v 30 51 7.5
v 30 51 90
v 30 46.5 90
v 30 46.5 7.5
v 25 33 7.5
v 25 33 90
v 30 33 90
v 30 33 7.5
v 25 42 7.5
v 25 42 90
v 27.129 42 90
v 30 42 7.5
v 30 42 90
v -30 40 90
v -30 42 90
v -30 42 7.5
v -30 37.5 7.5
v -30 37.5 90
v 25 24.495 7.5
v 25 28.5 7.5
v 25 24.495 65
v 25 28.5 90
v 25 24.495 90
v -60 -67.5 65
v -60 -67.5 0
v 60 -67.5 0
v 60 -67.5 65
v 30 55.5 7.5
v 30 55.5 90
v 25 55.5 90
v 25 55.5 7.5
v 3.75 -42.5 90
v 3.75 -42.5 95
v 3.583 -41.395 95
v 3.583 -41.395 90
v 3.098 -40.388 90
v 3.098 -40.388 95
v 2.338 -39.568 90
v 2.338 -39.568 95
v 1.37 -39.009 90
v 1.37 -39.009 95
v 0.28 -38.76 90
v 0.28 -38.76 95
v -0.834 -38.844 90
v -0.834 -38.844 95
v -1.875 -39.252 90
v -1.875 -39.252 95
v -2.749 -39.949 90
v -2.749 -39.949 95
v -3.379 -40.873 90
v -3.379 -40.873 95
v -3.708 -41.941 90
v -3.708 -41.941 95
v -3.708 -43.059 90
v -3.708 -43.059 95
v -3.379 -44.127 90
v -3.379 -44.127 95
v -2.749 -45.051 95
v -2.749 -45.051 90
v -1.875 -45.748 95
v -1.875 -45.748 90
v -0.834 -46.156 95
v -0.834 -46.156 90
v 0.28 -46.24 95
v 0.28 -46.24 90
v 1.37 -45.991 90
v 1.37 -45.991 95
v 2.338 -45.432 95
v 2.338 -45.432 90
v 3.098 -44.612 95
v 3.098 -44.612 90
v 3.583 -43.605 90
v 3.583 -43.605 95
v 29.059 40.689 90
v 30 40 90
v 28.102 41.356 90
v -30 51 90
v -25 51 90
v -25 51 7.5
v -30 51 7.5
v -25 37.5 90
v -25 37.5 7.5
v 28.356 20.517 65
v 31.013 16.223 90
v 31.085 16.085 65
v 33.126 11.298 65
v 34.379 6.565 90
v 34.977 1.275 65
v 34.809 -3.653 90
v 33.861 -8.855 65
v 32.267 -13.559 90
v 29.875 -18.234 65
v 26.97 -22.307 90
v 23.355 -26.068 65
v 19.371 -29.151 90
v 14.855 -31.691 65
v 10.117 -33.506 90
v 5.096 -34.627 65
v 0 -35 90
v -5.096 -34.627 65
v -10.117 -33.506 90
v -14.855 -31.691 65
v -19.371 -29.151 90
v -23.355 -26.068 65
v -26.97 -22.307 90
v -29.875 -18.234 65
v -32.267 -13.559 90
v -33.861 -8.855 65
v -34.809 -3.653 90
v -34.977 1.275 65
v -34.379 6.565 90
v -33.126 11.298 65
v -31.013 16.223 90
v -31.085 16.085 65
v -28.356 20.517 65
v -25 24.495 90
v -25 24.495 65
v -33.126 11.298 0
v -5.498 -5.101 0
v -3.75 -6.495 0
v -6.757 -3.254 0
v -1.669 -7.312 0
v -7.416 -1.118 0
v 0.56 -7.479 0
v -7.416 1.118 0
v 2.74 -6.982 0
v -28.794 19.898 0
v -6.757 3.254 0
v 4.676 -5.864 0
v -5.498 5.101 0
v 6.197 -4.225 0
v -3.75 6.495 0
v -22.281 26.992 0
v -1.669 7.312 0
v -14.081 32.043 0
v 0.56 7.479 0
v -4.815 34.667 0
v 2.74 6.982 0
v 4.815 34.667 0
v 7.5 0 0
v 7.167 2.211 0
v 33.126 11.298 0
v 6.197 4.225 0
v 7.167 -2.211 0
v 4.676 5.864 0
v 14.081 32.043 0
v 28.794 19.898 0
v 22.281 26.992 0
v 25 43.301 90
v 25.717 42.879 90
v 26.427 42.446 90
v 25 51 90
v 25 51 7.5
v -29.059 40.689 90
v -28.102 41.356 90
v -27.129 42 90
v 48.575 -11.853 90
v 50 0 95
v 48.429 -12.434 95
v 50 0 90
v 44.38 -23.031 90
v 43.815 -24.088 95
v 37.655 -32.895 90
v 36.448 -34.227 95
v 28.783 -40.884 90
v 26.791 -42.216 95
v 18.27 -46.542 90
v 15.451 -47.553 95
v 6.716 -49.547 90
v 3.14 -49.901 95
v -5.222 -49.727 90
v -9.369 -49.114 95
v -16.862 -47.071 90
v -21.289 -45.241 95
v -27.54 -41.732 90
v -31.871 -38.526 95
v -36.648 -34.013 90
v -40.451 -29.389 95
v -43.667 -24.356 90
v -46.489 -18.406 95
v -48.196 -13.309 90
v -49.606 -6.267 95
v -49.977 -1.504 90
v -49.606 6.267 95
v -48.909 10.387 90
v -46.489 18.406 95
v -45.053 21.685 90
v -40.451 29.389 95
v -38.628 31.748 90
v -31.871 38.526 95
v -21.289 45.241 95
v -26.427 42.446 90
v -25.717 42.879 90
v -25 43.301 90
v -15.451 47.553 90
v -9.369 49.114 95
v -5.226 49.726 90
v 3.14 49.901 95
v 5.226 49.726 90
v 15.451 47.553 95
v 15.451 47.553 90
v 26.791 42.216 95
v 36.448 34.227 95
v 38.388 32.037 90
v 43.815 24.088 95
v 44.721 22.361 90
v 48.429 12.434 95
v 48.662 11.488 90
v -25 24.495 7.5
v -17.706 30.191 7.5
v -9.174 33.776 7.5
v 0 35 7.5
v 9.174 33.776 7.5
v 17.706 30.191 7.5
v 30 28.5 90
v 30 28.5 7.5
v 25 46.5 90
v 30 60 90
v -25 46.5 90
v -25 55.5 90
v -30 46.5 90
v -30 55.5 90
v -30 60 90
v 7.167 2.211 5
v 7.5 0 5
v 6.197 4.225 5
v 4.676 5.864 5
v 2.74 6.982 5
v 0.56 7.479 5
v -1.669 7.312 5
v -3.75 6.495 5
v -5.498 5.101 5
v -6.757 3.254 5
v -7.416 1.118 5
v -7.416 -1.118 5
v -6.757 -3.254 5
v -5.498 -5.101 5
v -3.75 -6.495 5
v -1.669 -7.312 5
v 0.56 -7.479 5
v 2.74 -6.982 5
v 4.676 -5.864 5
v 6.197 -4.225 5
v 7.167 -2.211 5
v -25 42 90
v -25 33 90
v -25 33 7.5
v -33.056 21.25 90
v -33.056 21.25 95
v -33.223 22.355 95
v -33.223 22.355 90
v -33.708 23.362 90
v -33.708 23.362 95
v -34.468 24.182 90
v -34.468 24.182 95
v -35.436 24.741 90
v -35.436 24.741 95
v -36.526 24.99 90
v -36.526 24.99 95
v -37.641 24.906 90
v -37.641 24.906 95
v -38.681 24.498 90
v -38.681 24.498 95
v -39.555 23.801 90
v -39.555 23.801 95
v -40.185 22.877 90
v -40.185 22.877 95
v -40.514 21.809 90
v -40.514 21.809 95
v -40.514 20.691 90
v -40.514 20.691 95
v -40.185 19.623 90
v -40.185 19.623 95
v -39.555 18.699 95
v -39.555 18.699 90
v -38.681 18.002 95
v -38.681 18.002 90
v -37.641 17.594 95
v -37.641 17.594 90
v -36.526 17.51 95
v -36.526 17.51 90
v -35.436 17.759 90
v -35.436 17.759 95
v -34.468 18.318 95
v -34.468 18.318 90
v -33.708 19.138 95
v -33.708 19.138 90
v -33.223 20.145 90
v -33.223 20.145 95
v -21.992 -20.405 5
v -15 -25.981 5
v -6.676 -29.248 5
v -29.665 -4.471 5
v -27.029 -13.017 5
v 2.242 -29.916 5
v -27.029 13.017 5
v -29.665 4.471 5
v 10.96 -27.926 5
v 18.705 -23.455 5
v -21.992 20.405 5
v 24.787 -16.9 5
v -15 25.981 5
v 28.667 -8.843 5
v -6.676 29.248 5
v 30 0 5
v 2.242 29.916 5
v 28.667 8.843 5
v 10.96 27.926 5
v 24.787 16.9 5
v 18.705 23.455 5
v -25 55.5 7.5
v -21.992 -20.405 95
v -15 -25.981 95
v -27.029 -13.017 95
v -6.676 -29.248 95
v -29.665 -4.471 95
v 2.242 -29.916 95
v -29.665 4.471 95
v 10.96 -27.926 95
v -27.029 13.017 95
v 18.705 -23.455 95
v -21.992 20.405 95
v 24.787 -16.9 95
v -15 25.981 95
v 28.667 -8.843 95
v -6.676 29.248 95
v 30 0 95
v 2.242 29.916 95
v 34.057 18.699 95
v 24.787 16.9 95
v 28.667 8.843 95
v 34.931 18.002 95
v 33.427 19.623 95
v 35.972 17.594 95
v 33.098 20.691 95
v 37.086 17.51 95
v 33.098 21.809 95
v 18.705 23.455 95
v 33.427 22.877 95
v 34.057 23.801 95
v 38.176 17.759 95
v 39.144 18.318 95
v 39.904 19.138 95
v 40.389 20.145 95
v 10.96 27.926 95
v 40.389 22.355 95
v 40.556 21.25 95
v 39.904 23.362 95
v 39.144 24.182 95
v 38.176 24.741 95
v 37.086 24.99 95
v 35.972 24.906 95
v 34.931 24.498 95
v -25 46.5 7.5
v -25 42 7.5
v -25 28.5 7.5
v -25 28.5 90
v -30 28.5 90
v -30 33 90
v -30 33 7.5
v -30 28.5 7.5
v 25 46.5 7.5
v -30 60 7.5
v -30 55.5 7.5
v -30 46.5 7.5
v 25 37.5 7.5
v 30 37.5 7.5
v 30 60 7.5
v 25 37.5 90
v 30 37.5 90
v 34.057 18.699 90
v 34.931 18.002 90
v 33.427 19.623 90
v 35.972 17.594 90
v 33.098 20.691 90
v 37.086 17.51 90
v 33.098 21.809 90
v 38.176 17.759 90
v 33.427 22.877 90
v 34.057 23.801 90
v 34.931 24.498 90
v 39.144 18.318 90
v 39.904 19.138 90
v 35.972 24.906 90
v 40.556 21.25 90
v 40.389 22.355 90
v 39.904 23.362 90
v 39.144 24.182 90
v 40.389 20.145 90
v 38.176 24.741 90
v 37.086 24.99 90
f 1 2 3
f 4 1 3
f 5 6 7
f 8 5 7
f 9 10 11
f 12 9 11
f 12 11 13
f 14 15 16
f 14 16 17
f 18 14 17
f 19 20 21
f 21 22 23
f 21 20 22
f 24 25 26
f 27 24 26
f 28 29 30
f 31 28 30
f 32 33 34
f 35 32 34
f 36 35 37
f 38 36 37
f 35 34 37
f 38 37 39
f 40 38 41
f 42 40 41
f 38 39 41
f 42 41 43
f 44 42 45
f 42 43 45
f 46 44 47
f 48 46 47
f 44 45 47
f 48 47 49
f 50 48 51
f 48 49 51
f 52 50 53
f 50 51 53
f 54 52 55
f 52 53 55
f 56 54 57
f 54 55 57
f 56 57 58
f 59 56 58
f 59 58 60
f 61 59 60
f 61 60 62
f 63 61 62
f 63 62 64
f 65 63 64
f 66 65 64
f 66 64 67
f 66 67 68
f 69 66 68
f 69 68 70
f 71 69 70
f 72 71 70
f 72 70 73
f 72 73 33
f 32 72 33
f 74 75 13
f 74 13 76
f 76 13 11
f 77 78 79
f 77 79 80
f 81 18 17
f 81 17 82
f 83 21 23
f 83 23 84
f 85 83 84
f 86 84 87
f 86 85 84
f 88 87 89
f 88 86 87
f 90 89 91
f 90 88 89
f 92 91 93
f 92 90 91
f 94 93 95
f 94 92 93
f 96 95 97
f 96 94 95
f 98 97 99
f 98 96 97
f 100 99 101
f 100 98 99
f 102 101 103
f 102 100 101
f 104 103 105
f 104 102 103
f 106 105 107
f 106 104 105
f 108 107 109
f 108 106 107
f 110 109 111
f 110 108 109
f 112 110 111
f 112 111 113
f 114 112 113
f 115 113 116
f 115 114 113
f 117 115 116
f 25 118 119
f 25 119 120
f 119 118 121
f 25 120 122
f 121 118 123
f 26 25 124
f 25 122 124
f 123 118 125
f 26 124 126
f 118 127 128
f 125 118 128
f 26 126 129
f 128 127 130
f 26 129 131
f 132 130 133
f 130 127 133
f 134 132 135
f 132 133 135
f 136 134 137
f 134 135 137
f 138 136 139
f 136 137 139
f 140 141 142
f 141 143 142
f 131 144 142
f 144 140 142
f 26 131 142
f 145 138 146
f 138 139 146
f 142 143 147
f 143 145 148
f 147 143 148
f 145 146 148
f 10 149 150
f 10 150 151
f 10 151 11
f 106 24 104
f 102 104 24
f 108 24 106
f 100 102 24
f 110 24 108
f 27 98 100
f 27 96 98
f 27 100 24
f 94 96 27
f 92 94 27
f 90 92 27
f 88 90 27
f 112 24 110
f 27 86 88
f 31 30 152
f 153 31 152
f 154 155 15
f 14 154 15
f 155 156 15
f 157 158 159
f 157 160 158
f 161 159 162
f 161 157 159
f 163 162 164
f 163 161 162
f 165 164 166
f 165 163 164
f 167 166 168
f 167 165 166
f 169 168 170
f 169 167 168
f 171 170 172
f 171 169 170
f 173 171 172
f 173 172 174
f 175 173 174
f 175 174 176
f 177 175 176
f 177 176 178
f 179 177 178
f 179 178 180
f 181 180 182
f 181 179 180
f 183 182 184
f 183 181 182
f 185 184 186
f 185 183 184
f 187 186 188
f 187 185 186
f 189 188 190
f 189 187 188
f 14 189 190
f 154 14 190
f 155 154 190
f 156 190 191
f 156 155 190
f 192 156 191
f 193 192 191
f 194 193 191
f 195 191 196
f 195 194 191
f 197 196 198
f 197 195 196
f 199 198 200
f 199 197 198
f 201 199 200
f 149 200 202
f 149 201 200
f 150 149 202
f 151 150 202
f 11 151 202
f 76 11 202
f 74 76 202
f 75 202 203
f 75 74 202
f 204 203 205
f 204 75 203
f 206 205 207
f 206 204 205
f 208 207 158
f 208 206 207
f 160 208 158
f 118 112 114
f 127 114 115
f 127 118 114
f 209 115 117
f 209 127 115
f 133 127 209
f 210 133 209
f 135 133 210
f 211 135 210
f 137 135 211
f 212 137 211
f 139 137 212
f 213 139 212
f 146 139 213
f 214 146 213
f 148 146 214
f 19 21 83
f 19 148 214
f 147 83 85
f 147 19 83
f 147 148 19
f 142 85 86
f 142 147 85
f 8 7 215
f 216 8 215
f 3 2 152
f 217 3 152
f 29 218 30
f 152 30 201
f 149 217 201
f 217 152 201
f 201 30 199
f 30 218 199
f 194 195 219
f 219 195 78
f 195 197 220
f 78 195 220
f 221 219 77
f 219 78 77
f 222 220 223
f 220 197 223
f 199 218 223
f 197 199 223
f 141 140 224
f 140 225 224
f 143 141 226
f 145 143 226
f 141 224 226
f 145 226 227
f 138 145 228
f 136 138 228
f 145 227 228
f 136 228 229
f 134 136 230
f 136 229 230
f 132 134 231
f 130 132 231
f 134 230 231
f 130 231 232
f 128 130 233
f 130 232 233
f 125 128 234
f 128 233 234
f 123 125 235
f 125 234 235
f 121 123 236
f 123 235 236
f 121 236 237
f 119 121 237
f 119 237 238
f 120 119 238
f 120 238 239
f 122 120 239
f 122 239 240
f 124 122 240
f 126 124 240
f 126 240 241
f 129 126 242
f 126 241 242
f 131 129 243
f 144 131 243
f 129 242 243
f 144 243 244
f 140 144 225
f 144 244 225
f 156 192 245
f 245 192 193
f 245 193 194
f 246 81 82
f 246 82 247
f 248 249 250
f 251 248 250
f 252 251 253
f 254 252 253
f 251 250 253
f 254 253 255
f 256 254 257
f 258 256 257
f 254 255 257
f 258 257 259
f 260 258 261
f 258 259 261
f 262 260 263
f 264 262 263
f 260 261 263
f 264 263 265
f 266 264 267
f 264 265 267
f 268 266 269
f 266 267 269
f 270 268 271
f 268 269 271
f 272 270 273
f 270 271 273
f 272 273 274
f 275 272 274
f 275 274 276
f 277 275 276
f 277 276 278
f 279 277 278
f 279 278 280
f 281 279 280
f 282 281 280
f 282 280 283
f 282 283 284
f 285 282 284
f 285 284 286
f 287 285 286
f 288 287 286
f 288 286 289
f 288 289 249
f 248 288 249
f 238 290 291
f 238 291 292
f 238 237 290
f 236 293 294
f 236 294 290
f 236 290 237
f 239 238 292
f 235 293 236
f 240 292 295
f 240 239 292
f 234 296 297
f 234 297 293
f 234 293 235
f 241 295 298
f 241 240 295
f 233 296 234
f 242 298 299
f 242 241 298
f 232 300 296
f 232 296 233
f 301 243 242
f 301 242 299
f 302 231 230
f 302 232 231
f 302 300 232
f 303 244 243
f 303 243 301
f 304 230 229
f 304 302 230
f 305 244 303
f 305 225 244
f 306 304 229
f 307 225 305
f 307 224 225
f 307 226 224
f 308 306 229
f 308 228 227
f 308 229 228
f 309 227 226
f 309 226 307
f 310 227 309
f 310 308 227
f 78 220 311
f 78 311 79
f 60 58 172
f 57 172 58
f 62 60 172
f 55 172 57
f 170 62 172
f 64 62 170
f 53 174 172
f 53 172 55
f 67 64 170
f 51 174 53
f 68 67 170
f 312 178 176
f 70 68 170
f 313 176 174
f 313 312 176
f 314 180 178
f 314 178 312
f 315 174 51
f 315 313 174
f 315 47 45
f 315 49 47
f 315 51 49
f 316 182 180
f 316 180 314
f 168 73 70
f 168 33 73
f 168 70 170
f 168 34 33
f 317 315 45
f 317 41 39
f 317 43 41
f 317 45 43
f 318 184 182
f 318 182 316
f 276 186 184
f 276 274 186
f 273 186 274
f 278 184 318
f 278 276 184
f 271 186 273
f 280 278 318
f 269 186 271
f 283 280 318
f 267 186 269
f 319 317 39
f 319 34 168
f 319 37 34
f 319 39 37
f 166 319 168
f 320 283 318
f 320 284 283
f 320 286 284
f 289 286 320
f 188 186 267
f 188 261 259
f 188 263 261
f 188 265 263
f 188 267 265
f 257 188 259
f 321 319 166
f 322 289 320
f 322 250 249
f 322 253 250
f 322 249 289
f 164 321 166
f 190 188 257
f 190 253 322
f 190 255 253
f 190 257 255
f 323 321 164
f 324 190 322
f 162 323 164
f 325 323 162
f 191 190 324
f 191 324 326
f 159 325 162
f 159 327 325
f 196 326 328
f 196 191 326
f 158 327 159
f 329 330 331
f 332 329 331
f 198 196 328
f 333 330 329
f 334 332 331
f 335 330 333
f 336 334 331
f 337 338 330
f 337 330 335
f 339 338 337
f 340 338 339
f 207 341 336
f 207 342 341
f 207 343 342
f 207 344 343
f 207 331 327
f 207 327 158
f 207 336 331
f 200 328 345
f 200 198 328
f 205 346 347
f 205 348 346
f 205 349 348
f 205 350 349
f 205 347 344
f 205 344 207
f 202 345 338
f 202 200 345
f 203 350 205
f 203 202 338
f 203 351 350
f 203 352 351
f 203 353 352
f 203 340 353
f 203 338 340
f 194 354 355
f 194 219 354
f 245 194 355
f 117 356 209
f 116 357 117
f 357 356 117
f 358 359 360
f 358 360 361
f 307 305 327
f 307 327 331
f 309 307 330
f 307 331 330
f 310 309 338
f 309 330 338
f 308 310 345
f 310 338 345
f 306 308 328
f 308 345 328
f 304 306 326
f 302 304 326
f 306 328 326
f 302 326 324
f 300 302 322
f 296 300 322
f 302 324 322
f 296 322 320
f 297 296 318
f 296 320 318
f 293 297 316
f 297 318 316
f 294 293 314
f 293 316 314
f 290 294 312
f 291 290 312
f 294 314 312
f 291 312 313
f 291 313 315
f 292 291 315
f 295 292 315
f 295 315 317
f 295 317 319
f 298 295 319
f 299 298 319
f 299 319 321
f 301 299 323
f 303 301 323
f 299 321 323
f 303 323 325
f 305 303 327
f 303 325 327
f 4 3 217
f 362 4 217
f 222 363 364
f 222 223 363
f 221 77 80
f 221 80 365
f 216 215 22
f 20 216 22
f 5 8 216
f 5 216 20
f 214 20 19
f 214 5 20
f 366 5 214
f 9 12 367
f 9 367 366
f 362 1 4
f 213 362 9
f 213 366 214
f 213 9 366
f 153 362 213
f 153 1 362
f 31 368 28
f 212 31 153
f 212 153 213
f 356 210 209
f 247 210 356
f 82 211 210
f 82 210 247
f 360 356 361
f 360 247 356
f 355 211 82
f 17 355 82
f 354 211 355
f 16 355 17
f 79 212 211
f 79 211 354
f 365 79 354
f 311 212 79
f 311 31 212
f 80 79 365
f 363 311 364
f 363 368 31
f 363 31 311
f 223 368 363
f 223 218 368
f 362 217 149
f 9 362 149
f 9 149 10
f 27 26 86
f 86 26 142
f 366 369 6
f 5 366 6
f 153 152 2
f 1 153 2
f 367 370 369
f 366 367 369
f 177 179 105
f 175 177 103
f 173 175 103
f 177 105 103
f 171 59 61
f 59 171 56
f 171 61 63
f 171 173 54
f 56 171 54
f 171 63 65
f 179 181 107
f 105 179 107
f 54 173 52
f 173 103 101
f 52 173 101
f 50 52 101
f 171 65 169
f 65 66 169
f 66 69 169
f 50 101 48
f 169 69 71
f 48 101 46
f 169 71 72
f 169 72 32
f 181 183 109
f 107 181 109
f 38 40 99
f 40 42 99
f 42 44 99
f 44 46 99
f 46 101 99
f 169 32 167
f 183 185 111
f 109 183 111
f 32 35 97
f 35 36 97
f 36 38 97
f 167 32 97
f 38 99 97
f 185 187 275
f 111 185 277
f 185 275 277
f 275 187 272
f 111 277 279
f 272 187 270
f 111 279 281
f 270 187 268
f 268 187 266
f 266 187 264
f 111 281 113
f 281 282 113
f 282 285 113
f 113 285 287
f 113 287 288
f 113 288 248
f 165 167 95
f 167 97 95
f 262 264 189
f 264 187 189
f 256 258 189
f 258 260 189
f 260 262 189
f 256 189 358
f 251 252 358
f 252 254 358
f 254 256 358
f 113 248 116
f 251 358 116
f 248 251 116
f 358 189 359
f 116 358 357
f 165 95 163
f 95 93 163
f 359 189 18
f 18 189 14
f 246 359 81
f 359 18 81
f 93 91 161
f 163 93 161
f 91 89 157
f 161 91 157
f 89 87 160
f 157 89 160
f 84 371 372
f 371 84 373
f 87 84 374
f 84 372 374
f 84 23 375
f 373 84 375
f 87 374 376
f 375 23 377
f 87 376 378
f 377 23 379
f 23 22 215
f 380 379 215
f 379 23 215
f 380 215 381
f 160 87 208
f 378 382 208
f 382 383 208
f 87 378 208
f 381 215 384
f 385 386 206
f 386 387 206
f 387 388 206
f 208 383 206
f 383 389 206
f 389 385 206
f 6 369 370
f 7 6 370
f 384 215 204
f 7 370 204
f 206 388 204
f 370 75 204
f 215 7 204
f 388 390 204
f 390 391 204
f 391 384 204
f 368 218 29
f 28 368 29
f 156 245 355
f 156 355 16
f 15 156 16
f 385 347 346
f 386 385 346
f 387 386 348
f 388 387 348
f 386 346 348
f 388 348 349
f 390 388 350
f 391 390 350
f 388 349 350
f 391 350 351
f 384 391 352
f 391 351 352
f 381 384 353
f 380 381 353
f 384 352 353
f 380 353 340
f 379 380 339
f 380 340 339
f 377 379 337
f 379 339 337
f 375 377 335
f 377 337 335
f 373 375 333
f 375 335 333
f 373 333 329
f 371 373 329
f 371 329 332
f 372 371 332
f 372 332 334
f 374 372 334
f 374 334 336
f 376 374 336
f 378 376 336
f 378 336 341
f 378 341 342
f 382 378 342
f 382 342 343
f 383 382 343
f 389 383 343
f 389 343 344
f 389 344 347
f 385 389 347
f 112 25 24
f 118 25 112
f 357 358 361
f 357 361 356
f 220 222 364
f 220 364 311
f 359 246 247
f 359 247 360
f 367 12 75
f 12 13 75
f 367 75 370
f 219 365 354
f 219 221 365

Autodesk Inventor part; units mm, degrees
ref_plane "YZ Plane" through (0, 0, 0) normal (1, 0, 0) x (0, 1, 0)
ref_plane "XZ Plane" through (0, 0, 0) normal (0, 1, 0) x (-1, 0, 0)
ref_plane "XY Plane" through (0, 0, 0) normal (0, 0, 1) x (1, 0, 0)
sketch "Sketch1" plane through (0, 0, 0) normal (0, 0, 1) x (1, 0, 0)
  arc A0 (33.1265, 11.2976) -> (-33.1265, 11.2976) centre (0, 0) ccw
  line L0 (-60, -67.5) -> (60, -67.5)
  line L1 (-60, -67.5) -> (-33.1265, 11.2976)
  line L2 (60, -67.5) -> (33.1265, 11.2976)
  point P0 (0, -67.5)
  dimension "d0" = 70
  dimension "d1" = 120
  dimension "d2" = 60
  dimension "d3" = 67.5
extrude "Extrusion1" add sketch "Sketch1" along normal blind 65
sketch "Sketch2" plane through (0, 0, 65) normal (0, 0, 1) x (1, 0, 0)
  circle A0 centre (0, 0) radius 35
  dimension "d6" = 70
extrude "Extrusion2" add sketch "Sketch2" along normal blind 25
sketch "Sketch3" plane through (0, 0, 90) normal (0, 0, 1) x (1, 0, 0)
  circle A0 centre (0, 0) radius 50
  dimension "d9" = 100
extrude "Extrusion3" add sketch "Sketch3" along normal blind 5
sketch "Sketch4" plane through (0, 0, 95) normal (0, 0, 1) x (1, 0, 0)
  circle A0 centre (0, -42.5) radius 3.75
  circle A1 centre (36.8061, 21.25) radius 3.75
  circle A2 centre (-36.8061, 21.25) radius 3.75
  point P0 (0, 0)
  dimension "d12" = 7.5
  dimension "d13" = 42.5
  dimension "d16" = 360
extrude "Extrusion4" cut sketch "Sketch4" against normal blind 5
sketch "Sketch5" plane through (0, 0, 90) normal (0, 0, -1) x (-1, 0, 0)
  line L0 (0, 60) -> (-30, 60)
  line L1 (-30, 60) -> (-30, 55.5)
  line L2 (-30, 55.5) -> (-25, 55.5)
  line L3 (-25, 55.5) -> (-25, 51)
  line L4 (-25, 51) -> (-30, 51)
  line L5 (-30, 51) -> (-30, 46.5)
  line L6 (-30, 46.5) -> (-25, 46.5)
  line L7 (-25, 46.5) -> (-25, 42)
  line L8 (-25, 42) -> (-30, 42)
  line L9 (-30, 42) -> (-30, 37.5)
  line L10 (-30, 37.5) -> (-25, 37.5)
  line L11 (-25, 37.5) -> (-25, 33)
  line L12 (-25, 33) -> (-30, 33)
  line L13 (-30, 33) -> (-30, 28.5)
  line L14 (-30, 28.5) -> (-25, 28.5)
  line L15 (-25, 28.5) -> (-25, 24)
  line L16 (-25, 24) -> (-30, 24)
  line L17 (-30, 24) -> (-30, 19.5)
  line L18 (-30, 19.5) -> (-25, 19.5)
  arc A0 (33.1265, 11.2976) -> (-33.1265, 11.2976) centre (0, 0) ccw projected
  line L19 (-25, 19.5) -> (0, 19.5)
  line L20 (0, 60) -> (30, 60)
  line L21 (30, 60) -> (30, 55.5)
  line L22 (30, 55.5) -> (25, 55.5)
  line L23 (25, 55.5) -> (25, 51)
  line L24 (25, 51) -> (30, 51)
  line L25 (30, 51) -> (30, 46.5)
  line L26 (30, 46.5) -> (25, 46.5)
  line L27 (25, 46.5) -> (25, 42)
  line L28 (25, 42) -> (30, 42)
  line L29 (30, 42) -> (30, 37.5)
  line L30 (30, 37.5) -> (25, 37.5)
  line L31 (25, 37.5) -> (25, 33)
  line L32 (25, 33) -> (30, 33)
  line L33 (30, 33) -> (30, 28.5)
  line L34 (30, 28.5) -> (25, 28.5)
  line L35 (25, 28.5) -> (25, 24)
  line L36 (25, 24) -> (30, 24)
  line L37 (30, 24) -> (30, 19.5)
  line L38 (30, 19.5) -> (25, 19.5)
  line L39 (25, 19.5) -> (0, 19.5)
  point P0 (0, 35)
  point P1 (-25, 24.4949)
  point P2 (25, 24.4949)
  dimension "d20" = 4.5
  dimension "d21" = 4.5
  dimension "d22" = 4.5
  dimension "d23" = 4.5
  dimension "d24" = 4.5
  dimension "d25" = 4.5
  dimension "d26" = 4.5
  dimension "d27" = 4.5
  dimension "d29" = 5
  dimension "d30" = 5
  dimension "d31" = 4.5
  dimension "d32" = 30
  dimension "d34" = 60
extrude "Extrusion5" add sketch "Sketch5" along normal blind 82.5 contours L20 L21 L22 L23 L24 L25 L26 L27 L28 L29 L30 L31 L32 L33 L34 L35 A0 L15 L14 L13 L12 L11 L10 L9 L8 L7 L6 L5 L4 L3 L2 L1 L0
sketch "Sketch6" plane through (0, 0, 95) normal (0, 0, 1) x (1, 0, 0)
  circle A0 centre (0, 0) radius 30
  dimension "d38" = 60
extrude "Extrusion6" cut sketch "Sketch6" against normal blind 90
sketch "Sketch7" plane through (0, 0, 5) normal (0, 0, 1) x (1, 0, 0)
  circle A0 centre (0, 0) radius 7.5
  dimension "d41" = 15
extrude "Extrusion7" cut sketch "Sketch7" against normal blind 90
properties part number "Base do Motor Industrial" material "Steel, Carbon"
